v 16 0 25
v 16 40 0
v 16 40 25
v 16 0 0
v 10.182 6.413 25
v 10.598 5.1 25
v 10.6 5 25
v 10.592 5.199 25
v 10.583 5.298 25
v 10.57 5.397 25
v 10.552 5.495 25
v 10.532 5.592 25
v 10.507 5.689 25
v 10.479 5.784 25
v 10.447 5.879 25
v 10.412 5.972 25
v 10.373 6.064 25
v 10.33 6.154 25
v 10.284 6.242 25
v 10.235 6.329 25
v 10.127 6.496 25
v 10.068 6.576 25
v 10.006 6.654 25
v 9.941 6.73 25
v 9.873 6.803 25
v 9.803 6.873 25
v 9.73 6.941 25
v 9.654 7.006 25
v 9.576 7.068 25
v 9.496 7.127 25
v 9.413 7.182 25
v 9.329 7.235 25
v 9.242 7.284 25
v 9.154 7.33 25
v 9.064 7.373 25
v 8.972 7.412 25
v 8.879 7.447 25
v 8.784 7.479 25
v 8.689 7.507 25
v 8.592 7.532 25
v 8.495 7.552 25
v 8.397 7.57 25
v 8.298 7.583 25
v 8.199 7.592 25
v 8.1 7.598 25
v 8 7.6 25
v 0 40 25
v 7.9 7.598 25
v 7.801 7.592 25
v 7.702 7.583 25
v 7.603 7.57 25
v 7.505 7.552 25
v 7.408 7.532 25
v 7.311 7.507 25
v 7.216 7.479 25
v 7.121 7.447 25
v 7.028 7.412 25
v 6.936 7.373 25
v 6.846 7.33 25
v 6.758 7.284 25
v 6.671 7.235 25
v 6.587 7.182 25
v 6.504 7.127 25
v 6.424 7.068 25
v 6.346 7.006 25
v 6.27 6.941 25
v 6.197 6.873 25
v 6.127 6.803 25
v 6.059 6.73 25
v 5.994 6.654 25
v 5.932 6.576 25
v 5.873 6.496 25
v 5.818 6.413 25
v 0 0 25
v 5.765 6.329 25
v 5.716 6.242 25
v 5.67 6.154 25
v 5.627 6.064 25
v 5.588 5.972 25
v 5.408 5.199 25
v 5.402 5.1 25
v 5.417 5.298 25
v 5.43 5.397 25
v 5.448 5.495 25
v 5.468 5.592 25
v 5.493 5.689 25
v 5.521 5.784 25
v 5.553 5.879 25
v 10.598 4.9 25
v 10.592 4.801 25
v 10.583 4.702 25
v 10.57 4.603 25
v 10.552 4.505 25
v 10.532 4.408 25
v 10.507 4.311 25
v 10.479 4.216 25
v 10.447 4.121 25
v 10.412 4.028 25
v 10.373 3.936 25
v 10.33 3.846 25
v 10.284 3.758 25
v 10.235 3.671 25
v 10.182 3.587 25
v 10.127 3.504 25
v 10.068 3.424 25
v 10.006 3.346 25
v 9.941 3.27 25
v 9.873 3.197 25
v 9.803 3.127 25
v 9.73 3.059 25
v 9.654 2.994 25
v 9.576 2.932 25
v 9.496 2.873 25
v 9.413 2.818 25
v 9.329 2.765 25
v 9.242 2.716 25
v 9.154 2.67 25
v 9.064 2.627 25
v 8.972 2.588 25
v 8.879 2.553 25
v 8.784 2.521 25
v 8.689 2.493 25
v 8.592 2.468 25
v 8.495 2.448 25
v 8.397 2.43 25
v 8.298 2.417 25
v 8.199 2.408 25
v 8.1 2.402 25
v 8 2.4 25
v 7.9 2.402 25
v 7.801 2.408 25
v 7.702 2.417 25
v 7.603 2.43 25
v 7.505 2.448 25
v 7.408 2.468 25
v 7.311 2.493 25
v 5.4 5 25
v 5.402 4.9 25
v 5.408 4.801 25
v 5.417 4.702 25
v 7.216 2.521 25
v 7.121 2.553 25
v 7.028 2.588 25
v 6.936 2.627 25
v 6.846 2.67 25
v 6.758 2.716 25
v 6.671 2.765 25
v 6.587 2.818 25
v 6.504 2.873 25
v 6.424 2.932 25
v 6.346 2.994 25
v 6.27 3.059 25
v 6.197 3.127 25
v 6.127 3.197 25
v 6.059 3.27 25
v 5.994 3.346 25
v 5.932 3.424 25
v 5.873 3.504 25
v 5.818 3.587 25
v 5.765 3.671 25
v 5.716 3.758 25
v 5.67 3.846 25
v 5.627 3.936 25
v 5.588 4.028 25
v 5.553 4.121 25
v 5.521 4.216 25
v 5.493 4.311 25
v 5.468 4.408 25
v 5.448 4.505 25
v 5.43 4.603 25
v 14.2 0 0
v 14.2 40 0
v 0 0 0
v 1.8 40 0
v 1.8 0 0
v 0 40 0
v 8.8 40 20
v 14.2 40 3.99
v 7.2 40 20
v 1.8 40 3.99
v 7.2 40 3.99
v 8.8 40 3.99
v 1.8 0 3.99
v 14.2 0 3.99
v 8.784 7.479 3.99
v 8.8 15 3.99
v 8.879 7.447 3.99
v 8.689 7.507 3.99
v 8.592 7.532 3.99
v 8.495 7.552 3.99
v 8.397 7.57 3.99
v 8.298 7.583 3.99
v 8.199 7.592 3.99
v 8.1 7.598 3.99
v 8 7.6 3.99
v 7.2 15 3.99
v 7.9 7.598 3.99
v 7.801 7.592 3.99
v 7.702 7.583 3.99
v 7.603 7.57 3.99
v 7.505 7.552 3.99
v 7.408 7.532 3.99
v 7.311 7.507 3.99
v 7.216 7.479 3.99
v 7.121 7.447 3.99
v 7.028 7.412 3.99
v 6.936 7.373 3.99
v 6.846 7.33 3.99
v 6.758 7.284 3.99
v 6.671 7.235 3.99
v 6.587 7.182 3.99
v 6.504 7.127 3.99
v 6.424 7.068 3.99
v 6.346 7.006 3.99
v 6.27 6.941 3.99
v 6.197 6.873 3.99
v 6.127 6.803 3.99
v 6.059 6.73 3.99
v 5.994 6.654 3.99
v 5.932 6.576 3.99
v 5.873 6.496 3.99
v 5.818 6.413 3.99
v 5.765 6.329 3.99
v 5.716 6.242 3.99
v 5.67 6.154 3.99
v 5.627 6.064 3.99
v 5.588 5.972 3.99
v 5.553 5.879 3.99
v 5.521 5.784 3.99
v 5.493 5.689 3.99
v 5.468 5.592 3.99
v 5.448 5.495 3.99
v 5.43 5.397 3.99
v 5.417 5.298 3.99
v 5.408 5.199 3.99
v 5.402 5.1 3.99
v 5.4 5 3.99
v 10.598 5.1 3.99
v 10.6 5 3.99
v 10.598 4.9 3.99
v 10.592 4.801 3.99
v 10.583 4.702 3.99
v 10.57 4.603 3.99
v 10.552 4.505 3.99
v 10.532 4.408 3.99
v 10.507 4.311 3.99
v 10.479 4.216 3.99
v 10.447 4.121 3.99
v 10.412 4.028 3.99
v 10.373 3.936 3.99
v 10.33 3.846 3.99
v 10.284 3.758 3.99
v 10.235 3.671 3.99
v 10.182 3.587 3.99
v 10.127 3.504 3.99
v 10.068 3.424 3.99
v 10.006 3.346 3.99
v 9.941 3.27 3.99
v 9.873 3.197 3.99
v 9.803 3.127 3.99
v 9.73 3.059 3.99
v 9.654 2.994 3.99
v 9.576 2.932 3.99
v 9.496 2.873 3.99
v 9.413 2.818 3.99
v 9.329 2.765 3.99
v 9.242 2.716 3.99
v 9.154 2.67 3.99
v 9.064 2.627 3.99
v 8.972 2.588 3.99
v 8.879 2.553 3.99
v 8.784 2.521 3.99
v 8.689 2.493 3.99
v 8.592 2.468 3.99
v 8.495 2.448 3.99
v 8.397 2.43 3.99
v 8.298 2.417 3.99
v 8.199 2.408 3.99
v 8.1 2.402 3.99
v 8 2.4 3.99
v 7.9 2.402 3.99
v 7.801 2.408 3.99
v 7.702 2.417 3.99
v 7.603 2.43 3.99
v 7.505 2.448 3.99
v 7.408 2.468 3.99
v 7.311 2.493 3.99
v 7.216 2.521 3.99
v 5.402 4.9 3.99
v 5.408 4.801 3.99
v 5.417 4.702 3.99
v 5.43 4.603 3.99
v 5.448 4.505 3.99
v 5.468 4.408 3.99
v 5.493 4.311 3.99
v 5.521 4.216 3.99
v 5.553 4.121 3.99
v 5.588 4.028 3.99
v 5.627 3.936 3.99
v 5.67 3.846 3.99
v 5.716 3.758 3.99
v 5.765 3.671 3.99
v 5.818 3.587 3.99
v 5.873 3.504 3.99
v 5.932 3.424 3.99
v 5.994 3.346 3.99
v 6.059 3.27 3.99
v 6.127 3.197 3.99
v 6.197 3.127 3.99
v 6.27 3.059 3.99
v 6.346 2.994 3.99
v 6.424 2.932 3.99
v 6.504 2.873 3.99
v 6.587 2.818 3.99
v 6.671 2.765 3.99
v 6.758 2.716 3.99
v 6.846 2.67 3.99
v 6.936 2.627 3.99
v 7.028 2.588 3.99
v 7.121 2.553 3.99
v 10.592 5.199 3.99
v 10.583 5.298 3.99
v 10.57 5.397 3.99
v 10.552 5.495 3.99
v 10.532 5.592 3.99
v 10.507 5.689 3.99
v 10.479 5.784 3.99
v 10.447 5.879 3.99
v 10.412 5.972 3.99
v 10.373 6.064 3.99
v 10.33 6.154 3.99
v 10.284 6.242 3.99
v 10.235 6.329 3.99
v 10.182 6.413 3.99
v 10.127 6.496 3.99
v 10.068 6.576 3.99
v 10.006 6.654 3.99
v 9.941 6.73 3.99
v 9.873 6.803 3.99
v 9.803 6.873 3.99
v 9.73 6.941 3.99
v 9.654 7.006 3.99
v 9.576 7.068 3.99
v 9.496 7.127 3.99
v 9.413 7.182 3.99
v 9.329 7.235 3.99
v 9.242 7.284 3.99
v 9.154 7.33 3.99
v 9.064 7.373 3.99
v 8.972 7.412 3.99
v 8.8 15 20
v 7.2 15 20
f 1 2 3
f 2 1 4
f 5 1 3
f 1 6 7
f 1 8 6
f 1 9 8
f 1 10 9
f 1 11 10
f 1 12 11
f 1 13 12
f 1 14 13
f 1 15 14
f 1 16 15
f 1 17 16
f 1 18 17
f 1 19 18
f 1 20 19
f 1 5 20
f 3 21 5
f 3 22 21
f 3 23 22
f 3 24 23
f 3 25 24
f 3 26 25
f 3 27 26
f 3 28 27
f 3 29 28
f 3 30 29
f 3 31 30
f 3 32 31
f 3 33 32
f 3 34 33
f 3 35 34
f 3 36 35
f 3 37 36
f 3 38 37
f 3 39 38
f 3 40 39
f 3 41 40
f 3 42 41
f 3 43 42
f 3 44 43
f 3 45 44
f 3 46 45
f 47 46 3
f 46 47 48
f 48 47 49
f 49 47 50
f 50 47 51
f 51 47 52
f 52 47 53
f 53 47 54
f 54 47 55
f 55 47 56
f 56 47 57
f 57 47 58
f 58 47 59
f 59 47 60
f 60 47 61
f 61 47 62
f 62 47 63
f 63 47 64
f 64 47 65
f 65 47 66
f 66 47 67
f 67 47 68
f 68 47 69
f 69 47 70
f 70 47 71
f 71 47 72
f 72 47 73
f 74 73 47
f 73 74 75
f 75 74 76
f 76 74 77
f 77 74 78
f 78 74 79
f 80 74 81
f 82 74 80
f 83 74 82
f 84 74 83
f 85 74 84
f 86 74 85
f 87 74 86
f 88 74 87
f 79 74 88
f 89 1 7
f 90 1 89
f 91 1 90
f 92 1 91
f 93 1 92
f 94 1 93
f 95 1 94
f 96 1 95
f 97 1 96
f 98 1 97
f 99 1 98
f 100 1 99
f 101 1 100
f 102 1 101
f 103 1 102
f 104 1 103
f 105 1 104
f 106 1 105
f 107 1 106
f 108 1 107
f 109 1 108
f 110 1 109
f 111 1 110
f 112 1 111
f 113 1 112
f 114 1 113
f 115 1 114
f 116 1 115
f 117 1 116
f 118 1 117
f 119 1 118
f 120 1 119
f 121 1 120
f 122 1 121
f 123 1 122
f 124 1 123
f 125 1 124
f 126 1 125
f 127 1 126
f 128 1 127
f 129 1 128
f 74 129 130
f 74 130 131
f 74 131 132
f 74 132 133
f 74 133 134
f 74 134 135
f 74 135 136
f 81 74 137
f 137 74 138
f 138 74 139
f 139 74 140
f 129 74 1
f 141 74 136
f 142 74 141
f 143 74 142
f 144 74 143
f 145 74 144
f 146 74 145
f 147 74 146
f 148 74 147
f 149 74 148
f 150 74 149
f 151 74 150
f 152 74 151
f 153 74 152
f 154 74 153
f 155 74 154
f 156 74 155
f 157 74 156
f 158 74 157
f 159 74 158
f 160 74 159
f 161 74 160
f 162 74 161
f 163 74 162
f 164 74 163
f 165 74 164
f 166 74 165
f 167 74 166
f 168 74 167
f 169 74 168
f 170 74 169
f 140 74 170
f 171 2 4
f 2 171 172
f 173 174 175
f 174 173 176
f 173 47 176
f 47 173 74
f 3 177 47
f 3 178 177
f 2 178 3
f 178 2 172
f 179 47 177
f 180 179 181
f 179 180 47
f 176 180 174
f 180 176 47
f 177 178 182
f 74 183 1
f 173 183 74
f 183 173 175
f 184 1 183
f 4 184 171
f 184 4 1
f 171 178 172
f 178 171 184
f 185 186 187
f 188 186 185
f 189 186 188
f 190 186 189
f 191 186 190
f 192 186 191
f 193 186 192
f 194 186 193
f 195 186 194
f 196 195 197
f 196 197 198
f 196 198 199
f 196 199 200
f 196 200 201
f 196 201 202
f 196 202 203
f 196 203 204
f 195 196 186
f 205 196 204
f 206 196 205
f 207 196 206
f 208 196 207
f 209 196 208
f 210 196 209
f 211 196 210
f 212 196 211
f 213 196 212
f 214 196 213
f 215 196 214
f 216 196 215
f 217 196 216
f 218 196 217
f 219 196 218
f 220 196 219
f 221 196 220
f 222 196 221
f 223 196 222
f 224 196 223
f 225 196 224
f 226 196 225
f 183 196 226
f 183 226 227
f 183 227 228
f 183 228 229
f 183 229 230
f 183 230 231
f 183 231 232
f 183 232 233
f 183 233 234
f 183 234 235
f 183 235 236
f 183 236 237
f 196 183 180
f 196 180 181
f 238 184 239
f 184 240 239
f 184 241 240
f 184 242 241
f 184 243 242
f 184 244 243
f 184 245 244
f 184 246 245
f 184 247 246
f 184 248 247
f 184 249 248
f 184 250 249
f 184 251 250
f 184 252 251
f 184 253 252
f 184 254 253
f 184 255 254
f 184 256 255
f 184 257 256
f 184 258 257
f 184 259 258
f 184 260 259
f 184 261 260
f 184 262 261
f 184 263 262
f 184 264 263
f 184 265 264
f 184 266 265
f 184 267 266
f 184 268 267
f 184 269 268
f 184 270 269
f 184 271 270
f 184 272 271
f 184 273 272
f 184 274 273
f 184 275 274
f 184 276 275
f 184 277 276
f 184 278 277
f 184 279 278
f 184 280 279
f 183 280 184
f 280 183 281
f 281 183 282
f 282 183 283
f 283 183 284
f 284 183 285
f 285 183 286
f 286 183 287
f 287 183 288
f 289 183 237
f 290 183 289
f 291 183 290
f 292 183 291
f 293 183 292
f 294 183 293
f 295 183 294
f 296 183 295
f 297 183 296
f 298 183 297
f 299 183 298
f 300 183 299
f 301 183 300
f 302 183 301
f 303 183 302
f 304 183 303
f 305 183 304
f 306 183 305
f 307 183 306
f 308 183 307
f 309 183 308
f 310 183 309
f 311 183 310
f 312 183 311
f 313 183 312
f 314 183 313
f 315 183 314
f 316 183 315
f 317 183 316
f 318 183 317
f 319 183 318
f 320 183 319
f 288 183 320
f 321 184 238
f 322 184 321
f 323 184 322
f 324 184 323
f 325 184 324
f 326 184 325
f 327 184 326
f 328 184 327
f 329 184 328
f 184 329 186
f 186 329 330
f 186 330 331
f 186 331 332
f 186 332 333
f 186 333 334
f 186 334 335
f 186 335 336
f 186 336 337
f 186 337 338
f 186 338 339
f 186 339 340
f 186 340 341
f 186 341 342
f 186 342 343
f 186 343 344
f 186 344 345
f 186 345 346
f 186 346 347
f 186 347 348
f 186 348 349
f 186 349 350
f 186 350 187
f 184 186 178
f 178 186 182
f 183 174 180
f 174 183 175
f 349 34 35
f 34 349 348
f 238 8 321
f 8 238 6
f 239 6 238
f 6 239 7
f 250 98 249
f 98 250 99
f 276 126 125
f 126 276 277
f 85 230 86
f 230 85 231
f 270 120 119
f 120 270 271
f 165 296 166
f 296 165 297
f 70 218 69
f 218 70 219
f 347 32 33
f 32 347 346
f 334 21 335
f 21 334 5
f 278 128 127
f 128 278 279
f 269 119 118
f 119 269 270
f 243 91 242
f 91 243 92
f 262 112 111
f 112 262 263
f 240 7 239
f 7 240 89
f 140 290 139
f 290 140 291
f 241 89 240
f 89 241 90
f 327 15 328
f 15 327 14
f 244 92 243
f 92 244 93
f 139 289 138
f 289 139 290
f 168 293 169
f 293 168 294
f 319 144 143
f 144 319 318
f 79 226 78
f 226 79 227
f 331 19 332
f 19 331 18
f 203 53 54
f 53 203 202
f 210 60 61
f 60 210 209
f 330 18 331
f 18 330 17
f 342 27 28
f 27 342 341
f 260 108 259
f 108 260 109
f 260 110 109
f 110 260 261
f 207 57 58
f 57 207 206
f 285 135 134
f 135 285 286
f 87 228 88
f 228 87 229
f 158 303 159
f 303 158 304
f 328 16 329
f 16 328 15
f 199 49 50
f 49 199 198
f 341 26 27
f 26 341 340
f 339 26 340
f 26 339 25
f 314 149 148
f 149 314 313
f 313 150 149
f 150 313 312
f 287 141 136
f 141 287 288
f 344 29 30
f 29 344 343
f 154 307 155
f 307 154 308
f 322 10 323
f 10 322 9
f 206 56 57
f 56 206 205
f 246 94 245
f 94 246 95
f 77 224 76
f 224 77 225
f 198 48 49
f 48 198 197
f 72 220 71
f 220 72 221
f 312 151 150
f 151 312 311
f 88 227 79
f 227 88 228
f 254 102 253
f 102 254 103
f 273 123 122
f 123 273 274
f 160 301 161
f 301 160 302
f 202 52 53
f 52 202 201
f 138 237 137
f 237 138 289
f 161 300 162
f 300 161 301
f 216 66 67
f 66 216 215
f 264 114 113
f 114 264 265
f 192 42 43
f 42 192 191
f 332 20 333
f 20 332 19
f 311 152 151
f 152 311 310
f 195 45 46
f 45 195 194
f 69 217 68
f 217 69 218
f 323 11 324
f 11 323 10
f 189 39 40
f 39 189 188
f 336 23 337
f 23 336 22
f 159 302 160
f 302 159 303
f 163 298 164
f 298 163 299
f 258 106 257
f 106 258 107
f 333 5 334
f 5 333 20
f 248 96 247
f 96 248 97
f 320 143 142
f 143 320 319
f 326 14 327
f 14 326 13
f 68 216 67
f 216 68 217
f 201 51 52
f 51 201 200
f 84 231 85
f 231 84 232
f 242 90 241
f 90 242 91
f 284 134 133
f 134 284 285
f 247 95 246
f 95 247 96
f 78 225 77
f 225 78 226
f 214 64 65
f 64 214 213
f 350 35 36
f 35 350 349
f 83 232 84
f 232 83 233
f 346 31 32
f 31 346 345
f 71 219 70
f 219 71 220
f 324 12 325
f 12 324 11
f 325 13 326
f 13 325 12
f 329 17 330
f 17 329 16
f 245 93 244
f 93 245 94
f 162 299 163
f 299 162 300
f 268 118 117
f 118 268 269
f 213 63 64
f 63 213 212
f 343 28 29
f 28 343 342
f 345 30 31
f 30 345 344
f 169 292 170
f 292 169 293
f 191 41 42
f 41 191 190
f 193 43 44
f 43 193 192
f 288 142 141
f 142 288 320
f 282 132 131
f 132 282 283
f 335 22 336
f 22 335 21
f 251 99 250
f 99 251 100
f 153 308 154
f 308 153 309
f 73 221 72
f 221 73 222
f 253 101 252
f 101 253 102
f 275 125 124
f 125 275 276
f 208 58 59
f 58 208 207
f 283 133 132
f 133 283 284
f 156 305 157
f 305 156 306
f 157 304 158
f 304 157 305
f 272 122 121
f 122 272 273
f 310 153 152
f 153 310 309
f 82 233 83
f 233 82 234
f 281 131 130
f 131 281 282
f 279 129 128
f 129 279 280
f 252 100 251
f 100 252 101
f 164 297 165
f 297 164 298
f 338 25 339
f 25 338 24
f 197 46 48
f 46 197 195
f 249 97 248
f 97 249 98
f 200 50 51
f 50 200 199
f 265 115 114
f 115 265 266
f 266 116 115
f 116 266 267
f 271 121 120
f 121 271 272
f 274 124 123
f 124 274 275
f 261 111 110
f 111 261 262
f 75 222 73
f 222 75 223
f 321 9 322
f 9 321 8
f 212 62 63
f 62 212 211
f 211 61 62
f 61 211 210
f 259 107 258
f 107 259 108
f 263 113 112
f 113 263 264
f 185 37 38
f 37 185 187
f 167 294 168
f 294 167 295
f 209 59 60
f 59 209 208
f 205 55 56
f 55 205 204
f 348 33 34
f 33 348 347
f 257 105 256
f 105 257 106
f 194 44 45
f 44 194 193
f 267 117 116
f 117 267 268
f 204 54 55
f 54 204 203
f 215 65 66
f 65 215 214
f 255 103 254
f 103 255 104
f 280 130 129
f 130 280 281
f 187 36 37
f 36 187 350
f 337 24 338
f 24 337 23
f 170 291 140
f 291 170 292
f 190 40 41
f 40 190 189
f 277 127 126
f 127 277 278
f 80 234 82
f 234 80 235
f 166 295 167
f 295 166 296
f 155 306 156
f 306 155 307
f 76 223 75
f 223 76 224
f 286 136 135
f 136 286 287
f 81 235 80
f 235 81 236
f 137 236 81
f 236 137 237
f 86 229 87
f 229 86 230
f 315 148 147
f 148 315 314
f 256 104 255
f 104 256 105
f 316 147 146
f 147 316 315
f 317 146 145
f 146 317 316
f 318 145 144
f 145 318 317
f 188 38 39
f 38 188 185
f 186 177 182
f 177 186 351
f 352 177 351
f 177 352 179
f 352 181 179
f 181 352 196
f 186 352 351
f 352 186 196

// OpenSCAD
$fa = 2;
$fs = 0.1;

difference(){
    cube([16, 40, 25]);
    translate([1.8,-1,-0.01])cube([12.4,100,4]);
    translate([8,5,-0.01])cylinder(r=2.5+0.1,h=100,center=true);
    
    translate([8,15+20,20-20])cube([1.6, 40, 40], center=true);
}
